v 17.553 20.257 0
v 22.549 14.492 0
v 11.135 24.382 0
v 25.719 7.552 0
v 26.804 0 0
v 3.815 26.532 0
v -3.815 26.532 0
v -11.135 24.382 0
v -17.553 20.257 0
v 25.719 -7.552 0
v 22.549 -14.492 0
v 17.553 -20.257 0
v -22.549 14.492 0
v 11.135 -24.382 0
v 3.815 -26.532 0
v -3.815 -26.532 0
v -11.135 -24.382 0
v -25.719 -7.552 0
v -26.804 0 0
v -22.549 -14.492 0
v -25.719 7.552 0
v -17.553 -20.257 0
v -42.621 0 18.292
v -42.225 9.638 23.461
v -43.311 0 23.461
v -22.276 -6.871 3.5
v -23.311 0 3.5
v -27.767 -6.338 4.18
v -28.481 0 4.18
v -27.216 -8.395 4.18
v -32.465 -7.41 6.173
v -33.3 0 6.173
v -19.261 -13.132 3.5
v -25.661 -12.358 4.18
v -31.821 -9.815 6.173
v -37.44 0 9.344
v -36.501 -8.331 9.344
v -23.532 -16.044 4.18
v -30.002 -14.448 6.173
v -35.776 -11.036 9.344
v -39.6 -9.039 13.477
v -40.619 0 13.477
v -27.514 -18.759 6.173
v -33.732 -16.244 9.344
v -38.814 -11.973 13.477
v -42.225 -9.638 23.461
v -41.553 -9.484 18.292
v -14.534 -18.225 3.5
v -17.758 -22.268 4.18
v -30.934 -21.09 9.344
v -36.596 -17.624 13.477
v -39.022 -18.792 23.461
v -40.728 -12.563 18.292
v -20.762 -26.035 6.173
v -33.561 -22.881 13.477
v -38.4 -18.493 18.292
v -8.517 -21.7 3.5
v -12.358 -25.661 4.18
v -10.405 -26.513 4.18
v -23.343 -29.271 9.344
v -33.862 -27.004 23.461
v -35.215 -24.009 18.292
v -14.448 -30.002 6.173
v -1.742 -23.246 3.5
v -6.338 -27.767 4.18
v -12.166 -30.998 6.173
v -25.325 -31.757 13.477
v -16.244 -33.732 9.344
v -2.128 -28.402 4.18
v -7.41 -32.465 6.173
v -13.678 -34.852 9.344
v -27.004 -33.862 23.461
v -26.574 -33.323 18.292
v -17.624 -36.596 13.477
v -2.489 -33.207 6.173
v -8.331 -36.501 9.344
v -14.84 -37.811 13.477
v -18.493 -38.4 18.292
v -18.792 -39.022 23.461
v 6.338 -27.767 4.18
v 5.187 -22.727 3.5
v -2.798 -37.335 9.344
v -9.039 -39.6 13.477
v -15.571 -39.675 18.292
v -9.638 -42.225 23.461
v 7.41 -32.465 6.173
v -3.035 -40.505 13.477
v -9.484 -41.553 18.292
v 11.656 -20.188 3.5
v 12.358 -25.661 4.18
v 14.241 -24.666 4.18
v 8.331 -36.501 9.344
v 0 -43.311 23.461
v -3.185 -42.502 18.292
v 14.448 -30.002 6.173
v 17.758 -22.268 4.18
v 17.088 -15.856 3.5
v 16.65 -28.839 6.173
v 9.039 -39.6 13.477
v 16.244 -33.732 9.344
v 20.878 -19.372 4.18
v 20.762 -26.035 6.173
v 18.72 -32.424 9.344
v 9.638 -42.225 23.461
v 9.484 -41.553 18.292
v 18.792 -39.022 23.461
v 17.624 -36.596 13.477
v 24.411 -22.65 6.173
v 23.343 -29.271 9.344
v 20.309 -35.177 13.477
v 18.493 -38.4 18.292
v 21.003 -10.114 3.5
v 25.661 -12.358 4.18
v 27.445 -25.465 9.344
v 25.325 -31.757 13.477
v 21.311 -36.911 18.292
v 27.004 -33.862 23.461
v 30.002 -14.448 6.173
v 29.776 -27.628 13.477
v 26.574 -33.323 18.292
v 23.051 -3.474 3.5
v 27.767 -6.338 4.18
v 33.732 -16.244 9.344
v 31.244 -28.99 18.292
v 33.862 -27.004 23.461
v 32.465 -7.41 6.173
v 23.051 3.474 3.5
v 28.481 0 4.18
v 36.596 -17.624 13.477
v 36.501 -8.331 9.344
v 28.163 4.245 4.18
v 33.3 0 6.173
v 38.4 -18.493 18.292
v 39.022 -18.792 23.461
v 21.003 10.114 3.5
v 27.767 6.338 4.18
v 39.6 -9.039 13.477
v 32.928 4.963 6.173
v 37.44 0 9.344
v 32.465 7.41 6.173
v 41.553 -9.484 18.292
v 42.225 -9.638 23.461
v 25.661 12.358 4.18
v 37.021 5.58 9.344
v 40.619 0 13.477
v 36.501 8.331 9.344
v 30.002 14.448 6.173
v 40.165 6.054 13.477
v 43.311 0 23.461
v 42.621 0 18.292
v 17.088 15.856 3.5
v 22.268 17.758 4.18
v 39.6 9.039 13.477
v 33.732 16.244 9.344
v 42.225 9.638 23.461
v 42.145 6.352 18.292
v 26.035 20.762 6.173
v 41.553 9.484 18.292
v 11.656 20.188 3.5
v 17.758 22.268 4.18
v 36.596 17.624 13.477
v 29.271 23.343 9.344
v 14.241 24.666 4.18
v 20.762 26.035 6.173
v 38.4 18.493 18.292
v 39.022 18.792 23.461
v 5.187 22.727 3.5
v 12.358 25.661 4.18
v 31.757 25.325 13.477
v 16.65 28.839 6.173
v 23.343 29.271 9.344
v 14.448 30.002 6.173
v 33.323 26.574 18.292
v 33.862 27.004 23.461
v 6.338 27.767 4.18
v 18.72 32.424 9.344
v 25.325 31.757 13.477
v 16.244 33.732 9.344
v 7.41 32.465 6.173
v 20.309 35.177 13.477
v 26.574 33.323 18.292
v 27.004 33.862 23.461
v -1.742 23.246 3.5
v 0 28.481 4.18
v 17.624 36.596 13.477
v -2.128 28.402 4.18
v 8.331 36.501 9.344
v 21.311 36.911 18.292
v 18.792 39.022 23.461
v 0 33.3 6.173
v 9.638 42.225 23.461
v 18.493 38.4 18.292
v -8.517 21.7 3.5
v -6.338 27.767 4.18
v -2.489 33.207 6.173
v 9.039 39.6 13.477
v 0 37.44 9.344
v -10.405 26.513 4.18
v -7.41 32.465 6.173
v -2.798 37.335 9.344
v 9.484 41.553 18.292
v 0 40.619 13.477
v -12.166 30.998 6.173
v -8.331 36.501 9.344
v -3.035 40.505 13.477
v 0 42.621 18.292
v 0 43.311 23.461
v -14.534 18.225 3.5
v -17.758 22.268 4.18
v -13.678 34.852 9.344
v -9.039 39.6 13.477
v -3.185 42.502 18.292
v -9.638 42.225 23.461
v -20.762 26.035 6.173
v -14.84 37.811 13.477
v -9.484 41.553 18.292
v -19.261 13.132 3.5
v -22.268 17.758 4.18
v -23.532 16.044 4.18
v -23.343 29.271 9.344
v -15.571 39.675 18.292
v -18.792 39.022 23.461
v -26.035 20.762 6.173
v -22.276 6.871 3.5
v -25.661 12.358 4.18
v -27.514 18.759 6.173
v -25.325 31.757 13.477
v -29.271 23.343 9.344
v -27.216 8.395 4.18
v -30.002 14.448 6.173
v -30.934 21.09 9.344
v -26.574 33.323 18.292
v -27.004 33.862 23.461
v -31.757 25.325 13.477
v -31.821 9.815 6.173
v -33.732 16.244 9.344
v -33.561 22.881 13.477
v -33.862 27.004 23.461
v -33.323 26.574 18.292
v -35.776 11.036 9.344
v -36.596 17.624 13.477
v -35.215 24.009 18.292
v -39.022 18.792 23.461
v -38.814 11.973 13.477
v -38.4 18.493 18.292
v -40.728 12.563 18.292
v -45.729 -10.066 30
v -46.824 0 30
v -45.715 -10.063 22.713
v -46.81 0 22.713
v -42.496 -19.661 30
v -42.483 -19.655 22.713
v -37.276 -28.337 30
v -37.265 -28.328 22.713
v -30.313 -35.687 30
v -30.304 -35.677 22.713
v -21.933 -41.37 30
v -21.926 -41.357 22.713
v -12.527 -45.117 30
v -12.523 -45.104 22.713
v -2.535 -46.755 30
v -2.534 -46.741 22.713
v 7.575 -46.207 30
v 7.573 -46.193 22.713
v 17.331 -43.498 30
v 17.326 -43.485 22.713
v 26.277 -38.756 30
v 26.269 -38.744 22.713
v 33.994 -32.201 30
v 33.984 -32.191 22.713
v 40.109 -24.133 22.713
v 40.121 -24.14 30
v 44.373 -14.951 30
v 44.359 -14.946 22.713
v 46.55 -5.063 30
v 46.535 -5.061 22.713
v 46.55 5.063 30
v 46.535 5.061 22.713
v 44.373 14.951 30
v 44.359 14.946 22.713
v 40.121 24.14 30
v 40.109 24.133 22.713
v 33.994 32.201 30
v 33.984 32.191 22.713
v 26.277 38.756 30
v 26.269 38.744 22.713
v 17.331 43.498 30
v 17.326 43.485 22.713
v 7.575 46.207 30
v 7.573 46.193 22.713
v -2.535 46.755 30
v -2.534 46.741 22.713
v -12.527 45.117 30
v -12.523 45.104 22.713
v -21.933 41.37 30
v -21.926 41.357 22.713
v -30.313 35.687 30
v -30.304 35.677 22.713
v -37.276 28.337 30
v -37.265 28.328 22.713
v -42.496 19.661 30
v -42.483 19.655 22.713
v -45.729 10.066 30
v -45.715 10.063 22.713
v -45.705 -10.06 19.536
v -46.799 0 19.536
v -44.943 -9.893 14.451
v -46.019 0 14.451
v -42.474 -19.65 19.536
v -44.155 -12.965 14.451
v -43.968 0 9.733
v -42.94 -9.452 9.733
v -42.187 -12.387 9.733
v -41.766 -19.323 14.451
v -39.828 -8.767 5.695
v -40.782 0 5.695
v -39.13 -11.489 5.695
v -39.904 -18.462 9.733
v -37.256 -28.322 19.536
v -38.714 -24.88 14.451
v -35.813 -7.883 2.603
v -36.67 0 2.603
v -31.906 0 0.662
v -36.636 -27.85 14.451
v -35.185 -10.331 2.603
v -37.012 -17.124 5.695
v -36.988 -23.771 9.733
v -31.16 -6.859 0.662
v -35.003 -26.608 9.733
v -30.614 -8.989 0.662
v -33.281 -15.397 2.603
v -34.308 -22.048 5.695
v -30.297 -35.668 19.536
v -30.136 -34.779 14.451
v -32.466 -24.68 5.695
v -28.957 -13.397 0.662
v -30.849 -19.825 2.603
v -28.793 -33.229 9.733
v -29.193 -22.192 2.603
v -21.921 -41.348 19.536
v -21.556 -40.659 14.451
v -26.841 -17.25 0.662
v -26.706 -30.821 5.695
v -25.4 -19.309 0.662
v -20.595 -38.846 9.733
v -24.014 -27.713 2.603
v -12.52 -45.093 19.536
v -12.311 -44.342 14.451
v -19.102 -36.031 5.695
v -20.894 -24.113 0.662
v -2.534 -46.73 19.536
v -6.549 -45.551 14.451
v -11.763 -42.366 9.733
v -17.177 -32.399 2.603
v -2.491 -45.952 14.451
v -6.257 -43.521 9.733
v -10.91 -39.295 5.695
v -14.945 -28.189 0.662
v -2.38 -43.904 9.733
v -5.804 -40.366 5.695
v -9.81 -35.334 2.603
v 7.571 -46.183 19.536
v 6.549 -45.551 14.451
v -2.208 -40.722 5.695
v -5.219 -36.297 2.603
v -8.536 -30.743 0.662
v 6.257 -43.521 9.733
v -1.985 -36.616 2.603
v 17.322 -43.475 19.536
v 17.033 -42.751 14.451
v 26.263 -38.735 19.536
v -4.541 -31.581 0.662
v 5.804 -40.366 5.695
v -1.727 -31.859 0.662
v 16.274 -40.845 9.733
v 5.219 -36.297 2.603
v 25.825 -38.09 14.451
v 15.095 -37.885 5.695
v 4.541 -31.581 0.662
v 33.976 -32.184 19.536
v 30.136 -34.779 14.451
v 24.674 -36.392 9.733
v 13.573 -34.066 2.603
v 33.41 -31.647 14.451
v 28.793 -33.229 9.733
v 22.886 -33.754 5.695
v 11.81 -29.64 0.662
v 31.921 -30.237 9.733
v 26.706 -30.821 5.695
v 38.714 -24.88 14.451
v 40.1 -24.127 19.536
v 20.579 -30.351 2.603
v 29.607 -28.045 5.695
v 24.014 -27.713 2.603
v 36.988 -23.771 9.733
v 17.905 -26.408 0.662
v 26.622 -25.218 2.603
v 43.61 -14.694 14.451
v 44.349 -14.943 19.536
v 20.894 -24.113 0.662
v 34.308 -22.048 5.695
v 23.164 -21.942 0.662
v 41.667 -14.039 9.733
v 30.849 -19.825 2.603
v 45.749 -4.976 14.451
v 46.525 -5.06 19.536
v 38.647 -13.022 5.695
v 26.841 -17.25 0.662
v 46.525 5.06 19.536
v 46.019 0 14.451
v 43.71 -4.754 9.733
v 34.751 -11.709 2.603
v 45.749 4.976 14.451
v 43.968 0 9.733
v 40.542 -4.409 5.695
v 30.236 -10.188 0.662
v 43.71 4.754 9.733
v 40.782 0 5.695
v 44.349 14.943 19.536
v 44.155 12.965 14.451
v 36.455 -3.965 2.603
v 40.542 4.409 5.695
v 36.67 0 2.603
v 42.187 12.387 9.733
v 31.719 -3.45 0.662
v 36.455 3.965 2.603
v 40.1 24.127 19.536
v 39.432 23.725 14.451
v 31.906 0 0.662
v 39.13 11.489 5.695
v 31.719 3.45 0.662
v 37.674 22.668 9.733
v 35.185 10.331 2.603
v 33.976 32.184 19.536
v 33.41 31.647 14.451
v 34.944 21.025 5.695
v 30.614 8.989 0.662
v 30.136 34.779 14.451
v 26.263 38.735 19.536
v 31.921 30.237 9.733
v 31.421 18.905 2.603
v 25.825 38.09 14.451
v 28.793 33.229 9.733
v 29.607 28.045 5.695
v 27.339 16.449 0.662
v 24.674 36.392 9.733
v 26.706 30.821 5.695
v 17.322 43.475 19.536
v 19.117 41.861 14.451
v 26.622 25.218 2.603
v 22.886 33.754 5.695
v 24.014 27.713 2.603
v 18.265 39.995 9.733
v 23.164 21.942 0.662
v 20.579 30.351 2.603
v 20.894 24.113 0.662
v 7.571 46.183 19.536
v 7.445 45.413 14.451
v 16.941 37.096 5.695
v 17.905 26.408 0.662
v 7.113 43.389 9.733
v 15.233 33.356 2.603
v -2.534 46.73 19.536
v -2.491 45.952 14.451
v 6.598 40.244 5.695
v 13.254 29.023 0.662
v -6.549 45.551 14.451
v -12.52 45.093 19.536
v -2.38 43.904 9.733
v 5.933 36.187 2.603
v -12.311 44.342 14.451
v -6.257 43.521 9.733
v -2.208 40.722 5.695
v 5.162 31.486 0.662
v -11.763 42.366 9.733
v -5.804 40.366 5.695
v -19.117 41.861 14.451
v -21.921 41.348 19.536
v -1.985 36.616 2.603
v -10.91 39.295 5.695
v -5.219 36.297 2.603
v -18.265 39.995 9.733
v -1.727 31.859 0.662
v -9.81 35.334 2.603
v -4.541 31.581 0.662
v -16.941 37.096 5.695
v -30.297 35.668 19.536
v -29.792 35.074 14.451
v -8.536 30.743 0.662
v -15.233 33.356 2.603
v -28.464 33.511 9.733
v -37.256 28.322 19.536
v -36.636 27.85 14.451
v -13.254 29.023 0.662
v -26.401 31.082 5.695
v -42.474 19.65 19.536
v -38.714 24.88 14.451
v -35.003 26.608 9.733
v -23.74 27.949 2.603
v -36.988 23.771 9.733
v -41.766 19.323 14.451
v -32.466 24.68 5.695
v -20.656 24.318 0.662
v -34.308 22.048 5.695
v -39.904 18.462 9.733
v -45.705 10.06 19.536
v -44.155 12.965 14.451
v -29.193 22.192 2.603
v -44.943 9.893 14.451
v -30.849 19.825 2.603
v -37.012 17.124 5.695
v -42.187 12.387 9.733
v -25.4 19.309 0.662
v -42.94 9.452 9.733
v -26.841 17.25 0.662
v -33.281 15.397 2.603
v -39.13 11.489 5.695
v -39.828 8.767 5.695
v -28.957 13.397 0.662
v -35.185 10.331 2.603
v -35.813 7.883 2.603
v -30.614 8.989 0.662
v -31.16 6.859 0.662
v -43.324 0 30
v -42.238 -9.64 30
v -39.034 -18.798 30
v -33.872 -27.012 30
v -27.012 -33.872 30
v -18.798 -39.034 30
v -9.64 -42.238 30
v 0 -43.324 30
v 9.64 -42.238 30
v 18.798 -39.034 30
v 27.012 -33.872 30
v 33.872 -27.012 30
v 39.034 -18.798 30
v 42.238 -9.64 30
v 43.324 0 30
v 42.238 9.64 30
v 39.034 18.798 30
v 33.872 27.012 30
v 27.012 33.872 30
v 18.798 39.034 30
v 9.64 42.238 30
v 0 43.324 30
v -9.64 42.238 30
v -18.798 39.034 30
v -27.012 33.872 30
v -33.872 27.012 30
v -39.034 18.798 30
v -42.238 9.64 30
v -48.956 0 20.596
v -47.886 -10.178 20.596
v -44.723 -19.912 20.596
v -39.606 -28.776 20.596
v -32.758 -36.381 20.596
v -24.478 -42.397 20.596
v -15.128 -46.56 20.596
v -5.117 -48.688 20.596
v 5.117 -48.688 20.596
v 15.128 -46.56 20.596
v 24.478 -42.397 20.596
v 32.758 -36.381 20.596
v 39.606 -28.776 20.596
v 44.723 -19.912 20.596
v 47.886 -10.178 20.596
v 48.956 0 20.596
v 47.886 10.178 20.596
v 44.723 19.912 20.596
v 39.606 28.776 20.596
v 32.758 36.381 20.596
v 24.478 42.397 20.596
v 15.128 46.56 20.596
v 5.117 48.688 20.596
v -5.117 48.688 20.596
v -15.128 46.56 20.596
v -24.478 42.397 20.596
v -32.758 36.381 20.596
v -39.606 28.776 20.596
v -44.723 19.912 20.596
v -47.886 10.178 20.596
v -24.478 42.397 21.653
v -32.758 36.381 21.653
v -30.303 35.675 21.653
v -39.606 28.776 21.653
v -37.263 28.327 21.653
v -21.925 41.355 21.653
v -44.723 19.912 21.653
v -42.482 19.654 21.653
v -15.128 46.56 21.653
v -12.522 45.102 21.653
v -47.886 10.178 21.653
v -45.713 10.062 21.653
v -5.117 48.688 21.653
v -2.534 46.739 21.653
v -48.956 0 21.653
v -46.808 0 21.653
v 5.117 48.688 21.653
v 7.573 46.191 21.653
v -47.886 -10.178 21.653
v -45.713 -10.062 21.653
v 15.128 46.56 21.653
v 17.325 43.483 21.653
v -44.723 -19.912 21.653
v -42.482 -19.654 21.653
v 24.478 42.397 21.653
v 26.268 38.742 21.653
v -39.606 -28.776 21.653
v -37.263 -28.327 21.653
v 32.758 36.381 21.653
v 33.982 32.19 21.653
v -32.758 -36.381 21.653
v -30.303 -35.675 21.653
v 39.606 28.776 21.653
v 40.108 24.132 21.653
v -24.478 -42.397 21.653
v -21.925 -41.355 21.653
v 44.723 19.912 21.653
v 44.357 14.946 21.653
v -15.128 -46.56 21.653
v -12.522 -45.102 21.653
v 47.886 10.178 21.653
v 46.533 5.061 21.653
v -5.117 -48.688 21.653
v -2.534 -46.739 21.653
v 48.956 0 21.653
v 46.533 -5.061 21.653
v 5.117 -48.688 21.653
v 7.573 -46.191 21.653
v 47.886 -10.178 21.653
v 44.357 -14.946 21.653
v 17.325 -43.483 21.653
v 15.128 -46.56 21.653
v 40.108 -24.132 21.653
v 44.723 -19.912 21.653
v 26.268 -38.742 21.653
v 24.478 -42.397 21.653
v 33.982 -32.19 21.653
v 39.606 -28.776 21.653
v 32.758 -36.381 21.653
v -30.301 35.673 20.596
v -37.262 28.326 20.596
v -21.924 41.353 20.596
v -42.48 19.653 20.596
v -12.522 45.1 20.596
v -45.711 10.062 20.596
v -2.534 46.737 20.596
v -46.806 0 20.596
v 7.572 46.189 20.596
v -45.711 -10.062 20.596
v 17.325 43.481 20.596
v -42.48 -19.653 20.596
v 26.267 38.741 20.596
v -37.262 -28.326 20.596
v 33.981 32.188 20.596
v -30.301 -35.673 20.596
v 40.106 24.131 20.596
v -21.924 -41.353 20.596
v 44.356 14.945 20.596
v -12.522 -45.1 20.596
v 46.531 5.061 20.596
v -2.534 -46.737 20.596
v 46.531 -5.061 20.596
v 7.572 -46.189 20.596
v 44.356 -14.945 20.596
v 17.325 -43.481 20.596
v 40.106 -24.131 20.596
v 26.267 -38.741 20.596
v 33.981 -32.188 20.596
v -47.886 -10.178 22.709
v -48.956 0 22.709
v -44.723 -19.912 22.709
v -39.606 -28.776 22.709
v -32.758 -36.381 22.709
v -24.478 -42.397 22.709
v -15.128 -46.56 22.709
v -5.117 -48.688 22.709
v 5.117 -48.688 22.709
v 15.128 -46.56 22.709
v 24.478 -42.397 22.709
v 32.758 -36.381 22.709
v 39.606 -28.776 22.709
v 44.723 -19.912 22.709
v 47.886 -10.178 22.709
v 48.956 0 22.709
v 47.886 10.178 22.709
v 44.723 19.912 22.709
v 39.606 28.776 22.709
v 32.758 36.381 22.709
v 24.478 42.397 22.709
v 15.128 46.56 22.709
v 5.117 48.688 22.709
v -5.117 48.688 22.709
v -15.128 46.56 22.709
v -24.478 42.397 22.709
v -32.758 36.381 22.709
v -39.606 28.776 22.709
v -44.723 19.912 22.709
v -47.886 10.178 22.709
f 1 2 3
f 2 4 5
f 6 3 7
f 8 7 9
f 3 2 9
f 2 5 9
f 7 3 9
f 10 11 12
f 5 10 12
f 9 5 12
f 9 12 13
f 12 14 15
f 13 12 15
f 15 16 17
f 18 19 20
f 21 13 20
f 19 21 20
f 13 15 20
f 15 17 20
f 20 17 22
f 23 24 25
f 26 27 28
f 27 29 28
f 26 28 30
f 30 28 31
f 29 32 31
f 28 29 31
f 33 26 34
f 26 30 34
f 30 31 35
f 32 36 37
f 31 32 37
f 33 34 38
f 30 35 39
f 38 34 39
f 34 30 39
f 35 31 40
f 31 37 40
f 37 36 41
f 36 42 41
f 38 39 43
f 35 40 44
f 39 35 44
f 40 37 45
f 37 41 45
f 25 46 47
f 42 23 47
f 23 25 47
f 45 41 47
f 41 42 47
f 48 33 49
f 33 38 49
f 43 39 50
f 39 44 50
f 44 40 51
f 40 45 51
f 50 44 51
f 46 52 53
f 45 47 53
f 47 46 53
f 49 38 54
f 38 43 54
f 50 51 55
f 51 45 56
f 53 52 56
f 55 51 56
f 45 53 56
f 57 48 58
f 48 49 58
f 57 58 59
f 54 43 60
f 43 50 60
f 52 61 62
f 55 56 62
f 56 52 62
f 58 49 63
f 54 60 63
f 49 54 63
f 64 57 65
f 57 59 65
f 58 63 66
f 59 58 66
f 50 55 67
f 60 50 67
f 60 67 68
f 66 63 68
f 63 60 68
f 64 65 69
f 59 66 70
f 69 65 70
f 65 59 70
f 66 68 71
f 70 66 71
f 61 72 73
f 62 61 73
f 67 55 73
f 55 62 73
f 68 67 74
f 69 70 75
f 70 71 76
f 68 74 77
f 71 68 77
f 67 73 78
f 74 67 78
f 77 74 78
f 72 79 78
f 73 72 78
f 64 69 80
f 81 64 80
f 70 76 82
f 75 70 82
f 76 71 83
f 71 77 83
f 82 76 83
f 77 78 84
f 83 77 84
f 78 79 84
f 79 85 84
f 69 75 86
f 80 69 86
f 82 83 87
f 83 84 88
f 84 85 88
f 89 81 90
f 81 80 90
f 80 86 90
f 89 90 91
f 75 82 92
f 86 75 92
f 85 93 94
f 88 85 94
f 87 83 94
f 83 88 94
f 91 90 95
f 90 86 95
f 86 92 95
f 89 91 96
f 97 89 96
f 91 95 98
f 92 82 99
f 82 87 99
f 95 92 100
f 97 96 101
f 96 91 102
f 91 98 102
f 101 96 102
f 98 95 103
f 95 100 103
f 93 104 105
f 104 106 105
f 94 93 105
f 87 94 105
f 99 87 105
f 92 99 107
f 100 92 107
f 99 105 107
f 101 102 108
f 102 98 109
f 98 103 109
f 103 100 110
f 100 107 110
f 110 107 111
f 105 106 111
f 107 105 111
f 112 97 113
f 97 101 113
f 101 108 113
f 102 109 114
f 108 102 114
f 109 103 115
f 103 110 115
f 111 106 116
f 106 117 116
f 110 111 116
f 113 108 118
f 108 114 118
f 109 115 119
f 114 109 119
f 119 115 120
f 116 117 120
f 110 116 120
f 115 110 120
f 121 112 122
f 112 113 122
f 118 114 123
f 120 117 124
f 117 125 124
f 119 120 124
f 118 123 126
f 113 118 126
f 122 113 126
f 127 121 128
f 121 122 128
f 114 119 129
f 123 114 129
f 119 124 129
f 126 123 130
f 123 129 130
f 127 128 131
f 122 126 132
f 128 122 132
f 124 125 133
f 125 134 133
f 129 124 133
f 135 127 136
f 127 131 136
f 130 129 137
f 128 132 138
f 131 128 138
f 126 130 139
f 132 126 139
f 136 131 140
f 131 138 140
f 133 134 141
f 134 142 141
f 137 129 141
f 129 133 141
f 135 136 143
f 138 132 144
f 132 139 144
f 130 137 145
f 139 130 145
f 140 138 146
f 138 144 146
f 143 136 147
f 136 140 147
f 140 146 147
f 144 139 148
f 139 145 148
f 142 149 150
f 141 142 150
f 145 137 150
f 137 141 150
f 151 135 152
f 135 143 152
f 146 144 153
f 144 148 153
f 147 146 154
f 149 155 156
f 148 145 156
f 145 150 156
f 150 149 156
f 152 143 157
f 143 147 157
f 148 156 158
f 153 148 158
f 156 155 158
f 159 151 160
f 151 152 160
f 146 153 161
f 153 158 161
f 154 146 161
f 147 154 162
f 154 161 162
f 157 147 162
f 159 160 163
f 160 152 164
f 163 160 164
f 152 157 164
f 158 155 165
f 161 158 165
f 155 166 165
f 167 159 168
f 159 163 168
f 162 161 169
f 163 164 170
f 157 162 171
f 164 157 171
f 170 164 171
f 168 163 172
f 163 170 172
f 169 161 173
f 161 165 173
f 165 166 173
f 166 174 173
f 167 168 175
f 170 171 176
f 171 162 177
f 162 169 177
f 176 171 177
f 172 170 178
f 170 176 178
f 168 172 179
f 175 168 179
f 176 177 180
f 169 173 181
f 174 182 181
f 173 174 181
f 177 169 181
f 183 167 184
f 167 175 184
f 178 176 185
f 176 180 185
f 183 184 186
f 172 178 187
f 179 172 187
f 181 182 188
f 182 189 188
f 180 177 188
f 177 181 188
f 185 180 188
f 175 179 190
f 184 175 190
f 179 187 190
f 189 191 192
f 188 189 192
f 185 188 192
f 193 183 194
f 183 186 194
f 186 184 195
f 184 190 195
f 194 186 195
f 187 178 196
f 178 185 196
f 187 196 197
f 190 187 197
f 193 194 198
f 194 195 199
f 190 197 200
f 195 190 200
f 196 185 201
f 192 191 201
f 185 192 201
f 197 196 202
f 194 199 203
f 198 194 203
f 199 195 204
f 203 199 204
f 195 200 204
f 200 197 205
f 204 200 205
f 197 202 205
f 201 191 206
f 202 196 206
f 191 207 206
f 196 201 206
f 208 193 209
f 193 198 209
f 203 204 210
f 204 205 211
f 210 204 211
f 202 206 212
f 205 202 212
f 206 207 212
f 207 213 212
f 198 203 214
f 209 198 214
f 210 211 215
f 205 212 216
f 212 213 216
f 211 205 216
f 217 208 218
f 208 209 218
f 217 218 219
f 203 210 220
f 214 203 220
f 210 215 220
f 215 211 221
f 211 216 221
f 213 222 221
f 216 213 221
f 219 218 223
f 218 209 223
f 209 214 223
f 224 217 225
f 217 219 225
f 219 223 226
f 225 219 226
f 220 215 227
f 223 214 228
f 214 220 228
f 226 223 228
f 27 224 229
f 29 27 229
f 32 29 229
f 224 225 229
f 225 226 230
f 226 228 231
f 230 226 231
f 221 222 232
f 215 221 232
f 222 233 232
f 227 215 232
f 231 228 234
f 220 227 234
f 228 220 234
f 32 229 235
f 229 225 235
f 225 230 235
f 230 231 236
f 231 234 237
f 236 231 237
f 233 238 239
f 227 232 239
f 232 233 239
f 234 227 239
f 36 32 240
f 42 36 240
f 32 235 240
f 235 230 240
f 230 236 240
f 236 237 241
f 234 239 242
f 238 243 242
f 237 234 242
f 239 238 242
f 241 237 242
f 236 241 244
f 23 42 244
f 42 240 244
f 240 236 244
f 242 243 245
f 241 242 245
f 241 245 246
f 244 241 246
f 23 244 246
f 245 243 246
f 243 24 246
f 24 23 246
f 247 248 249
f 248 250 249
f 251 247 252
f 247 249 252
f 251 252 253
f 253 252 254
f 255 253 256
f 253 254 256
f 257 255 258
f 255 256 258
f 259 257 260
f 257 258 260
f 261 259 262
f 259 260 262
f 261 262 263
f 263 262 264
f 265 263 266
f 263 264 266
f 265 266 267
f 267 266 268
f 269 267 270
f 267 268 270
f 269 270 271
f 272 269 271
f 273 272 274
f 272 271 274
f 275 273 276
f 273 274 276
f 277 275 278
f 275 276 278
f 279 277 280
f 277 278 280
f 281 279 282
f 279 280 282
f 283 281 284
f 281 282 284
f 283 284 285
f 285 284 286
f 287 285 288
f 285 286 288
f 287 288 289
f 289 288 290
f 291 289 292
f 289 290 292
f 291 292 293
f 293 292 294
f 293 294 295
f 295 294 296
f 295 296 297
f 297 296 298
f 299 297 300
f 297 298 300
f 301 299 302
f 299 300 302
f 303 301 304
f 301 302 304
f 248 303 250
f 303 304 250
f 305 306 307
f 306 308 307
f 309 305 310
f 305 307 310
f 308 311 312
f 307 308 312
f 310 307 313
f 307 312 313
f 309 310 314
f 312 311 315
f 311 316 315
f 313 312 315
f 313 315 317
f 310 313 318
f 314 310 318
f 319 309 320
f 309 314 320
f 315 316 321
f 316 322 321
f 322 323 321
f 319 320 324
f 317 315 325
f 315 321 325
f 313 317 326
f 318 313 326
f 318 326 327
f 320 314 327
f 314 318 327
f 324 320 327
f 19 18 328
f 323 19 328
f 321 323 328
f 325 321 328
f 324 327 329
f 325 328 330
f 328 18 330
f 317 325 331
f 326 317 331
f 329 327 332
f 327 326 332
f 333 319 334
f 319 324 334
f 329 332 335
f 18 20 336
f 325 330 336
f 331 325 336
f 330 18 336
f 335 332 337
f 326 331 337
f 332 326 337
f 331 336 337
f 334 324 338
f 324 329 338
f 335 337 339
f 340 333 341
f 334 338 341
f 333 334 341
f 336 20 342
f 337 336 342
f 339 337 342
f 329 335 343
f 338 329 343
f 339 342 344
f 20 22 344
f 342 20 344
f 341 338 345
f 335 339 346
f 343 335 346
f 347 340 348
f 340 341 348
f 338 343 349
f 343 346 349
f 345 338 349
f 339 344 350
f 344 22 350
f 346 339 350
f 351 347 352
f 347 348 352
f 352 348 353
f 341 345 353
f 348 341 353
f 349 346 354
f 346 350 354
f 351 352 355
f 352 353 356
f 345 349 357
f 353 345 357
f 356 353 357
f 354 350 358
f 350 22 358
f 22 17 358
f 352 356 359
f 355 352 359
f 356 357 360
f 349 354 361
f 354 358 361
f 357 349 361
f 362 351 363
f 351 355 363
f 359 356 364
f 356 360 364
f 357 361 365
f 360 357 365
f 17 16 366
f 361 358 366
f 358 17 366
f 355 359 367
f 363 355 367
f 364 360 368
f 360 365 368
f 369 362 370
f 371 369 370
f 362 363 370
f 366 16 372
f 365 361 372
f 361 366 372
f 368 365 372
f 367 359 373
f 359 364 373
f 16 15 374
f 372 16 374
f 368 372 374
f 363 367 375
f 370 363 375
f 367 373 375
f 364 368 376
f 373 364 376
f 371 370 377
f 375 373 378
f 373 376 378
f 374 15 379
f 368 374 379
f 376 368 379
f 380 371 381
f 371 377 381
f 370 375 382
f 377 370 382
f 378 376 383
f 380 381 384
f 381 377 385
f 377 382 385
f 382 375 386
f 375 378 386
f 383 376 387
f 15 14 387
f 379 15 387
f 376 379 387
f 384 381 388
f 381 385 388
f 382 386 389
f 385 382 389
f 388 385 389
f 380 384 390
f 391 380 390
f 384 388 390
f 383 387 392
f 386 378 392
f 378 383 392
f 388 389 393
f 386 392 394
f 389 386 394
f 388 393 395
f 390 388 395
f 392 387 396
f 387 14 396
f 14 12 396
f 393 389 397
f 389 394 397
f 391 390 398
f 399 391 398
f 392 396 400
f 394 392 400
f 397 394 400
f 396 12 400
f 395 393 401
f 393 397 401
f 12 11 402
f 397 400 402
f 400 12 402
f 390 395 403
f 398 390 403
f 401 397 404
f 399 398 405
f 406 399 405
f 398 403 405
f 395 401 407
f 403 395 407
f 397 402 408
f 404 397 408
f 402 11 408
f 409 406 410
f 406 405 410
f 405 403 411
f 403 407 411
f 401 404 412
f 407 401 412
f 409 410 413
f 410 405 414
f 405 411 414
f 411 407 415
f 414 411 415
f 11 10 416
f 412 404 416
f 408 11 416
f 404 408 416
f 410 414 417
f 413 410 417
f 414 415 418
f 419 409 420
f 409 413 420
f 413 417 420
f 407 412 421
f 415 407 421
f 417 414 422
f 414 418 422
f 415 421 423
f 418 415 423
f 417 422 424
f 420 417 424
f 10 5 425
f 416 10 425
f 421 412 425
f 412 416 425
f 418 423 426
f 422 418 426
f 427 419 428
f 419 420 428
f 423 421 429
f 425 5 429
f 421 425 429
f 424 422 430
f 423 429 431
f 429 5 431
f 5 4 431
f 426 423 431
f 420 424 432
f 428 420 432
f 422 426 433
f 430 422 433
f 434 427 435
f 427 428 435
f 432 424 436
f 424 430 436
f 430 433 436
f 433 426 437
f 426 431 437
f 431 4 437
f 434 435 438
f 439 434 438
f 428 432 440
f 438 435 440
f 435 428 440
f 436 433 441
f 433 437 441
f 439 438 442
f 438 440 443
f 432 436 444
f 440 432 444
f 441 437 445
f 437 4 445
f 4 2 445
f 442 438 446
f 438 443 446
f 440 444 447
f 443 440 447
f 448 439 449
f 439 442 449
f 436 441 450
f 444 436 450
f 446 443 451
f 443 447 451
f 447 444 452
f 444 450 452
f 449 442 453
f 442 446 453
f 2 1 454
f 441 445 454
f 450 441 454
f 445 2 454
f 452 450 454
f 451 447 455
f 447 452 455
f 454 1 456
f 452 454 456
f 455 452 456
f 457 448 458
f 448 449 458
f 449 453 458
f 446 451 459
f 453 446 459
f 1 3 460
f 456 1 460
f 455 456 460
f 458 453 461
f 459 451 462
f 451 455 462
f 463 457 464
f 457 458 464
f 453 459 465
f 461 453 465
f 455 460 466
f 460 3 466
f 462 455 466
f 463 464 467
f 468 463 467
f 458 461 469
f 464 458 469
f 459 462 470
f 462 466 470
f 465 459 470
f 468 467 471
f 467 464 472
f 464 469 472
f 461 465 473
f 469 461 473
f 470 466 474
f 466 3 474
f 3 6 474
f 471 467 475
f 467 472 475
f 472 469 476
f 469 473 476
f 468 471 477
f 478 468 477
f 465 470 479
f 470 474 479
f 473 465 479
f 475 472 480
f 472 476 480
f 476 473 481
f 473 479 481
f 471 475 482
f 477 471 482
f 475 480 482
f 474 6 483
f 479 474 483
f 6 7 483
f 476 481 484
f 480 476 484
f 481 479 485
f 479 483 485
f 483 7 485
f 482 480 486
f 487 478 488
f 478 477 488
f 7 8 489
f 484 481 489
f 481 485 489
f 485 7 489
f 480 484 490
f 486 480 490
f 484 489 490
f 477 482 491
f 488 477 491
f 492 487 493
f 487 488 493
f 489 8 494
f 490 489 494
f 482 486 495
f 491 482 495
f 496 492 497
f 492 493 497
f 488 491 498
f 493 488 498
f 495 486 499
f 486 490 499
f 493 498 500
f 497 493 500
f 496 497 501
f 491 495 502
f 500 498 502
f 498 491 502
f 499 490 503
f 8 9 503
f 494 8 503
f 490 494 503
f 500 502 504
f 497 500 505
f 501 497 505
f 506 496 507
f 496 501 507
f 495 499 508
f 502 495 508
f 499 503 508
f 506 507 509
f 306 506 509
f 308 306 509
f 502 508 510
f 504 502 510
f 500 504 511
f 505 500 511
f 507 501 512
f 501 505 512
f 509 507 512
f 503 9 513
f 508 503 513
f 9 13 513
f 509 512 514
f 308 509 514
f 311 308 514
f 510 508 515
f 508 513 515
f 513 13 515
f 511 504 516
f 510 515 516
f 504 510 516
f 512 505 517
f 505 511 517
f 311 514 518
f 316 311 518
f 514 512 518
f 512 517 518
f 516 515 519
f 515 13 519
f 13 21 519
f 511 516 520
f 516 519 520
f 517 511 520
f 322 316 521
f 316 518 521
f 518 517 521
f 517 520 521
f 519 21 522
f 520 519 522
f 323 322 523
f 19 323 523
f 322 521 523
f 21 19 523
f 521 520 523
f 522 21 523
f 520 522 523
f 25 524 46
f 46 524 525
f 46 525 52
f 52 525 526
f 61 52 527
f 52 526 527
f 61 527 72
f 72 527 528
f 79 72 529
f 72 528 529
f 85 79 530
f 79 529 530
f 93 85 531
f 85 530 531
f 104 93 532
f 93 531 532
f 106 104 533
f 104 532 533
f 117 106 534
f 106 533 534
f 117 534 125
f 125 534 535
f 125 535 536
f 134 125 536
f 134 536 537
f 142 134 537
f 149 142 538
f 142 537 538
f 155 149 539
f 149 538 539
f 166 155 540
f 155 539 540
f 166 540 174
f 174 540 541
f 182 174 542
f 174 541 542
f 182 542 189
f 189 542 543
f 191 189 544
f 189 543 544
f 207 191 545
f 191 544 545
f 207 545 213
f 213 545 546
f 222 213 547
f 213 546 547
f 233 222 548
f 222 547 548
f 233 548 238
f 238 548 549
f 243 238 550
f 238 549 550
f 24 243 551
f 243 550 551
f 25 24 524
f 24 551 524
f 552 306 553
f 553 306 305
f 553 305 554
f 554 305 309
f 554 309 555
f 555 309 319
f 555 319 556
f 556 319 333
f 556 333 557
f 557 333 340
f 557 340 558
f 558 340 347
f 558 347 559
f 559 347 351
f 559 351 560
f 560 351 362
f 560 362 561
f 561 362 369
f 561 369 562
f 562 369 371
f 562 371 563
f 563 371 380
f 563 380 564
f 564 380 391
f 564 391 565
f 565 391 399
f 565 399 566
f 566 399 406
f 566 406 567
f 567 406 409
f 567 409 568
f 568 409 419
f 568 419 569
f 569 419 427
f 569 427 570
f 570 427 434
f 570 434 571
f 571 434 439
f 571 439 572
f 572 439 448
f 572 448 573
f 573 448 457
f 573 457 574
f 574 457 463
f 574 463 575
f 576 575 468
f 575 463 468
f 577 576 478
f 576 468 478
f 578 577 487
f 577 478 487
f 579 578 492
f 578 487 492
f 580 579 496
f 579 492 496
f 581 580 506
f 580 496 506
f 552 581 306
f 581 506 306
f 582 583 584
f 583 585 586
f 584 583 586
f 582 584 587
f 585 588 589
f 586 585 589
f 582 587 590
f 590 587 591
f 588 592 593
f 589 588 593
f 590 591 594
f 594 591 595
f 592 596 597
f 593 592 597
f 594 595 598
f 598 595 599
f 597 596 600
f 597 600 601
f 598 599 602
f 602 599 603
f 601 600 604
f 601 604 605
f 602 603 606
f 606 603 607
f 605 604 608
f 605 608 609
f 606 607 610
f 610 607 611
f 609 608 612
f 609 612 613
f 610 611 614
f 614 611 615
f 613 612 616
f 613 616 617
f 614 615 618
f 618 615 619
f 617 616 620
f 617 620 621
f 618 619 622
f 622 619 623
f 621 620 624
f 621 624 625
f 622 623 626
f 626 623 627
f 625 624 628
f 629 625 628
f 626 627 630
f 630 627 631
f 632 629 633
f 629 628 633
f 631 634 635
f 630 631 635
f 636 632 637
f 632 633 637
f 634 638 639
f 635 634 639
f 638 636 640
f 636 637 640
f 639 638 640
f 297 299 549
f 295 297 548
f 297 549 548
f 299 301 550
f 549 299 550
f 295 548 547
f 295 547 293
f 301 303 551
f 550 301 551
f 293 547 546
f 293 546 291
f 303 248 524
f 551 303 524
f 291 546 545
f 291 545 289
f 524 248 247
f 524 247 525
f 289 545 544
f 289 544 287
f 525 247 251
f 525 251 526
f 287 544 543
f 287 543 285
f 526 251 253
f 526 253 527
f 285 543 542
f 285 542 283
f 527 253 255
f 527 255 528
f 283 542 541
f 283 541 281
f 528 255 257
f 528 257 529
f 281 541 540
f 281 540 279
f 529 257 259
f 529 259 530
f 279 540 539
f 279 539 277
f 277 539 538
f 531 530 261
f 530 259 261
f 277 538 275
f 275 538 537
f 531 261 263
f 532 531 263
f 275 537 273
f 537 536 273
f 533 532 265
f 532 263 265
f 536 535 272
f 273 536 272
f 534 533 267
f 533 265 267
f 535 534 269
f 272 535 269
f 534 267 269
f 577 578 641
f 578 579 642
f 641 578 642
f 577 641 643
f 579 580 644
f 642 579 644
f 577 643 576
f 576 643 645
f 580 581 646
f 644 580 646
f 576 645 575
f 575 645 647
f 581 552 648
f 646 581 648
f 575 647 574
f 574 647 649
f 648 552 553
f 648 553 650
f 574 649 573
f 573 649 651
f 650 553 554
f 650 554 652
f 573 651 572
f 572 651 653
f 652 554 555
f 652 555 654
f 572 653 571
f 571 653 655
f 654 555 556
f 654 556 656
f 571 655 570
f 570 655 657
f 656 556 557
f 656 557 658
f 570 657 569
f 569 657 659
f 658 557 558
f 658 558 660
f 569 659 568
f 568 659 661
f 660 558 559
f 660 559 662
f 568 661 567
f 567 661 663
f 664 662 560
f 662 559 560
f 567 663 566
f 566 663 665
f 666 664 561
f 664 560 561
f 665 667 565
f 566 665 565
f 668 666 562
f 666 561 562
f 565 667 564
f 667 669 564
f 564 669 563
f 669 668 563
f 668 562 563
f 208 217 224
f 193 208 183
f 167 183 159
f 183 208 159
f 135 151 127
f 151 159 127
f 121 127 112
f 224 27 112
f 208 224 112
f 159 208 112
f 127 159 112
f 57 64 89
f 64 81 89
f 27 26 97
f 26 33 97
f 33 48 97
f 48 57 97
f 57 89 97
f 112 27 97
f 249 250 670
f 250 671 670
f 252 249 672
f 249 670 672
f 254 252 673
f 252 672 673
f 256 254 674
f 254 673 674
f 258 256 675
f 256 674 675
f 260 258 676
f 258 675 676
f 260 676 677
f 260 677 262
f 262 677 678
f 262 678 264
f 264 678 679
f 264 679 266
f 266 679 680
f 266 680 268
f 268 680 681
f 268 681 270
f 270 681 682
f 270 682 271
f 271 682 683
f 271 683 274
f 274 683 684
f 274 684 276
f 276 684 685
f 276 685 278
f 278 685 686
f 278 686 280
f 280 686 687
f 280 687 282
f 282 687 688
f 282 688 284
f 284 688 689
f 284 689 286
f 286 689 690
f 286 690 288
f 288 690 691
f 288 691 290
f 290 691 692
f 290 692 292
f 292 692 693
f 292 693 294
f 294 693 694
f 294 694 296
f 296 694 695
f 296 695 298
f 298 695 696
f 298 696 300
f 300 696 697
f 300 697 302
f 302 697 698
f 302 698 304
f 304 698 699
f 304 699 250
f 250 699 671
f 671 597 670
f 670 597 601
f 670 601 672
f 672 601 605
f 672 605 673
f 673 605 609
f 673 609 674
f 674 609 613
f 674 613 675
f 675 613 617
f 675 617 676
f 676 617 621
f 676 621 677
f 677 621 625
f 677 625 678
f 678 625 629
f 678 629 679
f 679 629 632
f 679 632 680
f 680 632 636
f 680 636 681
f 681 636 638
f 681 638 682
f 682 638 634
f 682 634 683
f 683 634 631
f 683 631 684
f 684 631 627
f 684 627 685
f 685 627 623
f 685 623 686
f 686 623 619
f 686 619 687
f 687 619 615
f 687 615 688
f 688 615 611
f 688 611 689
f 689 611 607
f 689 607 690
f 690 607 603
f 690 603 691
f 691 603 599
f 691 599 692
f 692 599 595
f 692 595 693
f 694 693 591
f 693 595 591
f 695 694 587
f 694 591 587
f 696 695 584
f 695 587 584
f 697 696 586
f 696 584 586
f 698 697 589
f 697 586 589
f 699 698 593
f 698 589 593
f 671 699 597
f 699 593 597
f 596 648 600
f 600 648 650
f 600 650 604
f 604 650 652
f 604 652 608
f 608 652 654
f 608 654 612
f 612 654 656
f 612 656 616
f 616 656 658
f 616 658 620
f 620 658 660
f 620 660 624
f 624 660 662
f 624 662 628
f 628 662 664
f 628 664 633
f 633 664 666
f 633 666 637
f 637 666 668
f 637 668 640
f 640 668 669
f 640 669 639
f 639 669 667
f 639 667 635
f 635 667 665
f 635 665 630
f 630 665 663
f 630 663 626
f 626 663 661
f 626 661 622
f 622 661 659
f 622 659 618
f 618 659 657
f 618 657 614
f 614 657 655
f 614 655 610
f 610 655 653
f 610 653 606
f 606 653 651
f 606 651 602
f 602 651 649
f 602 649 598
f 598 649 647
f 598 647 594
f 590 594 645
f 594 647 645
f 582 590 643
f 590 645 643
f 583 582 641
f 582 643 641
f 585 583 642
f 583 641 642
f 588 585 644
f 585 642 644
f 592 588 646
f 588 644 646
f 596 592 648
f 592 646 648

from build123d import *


with BuildPart() as f1:
    # F0 (on Front) → F1 (revolve)
    with BuildSketch(Plane.XZ):
        with BuildLine():
            Line((-26.804441, 0), (0, 0))
            Line((0, 0), (0, 3.5))
            Line((0, 3.5), (-23.311267, 3.5))
            ThreePointArc((-23.311267, 3.5), (-37.439592, 9.344067), (-43.311229, 23.460957))
            Line((-43.311229, 23.460957), (-43.323994, 30))
            Line((-43.323994, 30), (-46.824001, 30))
            Line((-46.824001, 30), (-46.809776, 22.713209))
            Line((-46.809776, 22.713209), (-46.807706, 21.653051))
            Line((-46.807706, 21.653051), (-46.805643, 20.596067))
            Line((-46.805643, 20.596067), (-46.804403, 19.960957))
            ThreePointArc((-46.804403, 19.960957), (-46.802858, 19.748387), (-46.799054, 19.535845))
            ThreePointArc((-46.799054, 19.535845), (-40.78151, 5.694702), (-26.804441, 0))
        make_face()
        Polygon((-48.95586, 22.709019), (-46.807706, 21.653051), (-46.809776, 22.713209), align=None)
        Polygon((-48.95586, 21.653051), (-46.805643, 20.596067), (-46.807706, 21.653051), align=None)
        with BuildLine():
            Line((-48.95586, 20.596067), (-46.799054, 19.535845))
            ThreePointArc((-46.799054, 19.535845), (-46.802858, 19.748387), (-46.804403, 19.960957))
            Line((-46.804403, 19.960957), (-46.805643, 20.596067))
            Line((-46.805643, 20.596067), (-48.95586, 20.596067))
        make_face()
    revolve(axis=Axis((0, 0, 15), (0, 0, 1)))


solid = f1.part
